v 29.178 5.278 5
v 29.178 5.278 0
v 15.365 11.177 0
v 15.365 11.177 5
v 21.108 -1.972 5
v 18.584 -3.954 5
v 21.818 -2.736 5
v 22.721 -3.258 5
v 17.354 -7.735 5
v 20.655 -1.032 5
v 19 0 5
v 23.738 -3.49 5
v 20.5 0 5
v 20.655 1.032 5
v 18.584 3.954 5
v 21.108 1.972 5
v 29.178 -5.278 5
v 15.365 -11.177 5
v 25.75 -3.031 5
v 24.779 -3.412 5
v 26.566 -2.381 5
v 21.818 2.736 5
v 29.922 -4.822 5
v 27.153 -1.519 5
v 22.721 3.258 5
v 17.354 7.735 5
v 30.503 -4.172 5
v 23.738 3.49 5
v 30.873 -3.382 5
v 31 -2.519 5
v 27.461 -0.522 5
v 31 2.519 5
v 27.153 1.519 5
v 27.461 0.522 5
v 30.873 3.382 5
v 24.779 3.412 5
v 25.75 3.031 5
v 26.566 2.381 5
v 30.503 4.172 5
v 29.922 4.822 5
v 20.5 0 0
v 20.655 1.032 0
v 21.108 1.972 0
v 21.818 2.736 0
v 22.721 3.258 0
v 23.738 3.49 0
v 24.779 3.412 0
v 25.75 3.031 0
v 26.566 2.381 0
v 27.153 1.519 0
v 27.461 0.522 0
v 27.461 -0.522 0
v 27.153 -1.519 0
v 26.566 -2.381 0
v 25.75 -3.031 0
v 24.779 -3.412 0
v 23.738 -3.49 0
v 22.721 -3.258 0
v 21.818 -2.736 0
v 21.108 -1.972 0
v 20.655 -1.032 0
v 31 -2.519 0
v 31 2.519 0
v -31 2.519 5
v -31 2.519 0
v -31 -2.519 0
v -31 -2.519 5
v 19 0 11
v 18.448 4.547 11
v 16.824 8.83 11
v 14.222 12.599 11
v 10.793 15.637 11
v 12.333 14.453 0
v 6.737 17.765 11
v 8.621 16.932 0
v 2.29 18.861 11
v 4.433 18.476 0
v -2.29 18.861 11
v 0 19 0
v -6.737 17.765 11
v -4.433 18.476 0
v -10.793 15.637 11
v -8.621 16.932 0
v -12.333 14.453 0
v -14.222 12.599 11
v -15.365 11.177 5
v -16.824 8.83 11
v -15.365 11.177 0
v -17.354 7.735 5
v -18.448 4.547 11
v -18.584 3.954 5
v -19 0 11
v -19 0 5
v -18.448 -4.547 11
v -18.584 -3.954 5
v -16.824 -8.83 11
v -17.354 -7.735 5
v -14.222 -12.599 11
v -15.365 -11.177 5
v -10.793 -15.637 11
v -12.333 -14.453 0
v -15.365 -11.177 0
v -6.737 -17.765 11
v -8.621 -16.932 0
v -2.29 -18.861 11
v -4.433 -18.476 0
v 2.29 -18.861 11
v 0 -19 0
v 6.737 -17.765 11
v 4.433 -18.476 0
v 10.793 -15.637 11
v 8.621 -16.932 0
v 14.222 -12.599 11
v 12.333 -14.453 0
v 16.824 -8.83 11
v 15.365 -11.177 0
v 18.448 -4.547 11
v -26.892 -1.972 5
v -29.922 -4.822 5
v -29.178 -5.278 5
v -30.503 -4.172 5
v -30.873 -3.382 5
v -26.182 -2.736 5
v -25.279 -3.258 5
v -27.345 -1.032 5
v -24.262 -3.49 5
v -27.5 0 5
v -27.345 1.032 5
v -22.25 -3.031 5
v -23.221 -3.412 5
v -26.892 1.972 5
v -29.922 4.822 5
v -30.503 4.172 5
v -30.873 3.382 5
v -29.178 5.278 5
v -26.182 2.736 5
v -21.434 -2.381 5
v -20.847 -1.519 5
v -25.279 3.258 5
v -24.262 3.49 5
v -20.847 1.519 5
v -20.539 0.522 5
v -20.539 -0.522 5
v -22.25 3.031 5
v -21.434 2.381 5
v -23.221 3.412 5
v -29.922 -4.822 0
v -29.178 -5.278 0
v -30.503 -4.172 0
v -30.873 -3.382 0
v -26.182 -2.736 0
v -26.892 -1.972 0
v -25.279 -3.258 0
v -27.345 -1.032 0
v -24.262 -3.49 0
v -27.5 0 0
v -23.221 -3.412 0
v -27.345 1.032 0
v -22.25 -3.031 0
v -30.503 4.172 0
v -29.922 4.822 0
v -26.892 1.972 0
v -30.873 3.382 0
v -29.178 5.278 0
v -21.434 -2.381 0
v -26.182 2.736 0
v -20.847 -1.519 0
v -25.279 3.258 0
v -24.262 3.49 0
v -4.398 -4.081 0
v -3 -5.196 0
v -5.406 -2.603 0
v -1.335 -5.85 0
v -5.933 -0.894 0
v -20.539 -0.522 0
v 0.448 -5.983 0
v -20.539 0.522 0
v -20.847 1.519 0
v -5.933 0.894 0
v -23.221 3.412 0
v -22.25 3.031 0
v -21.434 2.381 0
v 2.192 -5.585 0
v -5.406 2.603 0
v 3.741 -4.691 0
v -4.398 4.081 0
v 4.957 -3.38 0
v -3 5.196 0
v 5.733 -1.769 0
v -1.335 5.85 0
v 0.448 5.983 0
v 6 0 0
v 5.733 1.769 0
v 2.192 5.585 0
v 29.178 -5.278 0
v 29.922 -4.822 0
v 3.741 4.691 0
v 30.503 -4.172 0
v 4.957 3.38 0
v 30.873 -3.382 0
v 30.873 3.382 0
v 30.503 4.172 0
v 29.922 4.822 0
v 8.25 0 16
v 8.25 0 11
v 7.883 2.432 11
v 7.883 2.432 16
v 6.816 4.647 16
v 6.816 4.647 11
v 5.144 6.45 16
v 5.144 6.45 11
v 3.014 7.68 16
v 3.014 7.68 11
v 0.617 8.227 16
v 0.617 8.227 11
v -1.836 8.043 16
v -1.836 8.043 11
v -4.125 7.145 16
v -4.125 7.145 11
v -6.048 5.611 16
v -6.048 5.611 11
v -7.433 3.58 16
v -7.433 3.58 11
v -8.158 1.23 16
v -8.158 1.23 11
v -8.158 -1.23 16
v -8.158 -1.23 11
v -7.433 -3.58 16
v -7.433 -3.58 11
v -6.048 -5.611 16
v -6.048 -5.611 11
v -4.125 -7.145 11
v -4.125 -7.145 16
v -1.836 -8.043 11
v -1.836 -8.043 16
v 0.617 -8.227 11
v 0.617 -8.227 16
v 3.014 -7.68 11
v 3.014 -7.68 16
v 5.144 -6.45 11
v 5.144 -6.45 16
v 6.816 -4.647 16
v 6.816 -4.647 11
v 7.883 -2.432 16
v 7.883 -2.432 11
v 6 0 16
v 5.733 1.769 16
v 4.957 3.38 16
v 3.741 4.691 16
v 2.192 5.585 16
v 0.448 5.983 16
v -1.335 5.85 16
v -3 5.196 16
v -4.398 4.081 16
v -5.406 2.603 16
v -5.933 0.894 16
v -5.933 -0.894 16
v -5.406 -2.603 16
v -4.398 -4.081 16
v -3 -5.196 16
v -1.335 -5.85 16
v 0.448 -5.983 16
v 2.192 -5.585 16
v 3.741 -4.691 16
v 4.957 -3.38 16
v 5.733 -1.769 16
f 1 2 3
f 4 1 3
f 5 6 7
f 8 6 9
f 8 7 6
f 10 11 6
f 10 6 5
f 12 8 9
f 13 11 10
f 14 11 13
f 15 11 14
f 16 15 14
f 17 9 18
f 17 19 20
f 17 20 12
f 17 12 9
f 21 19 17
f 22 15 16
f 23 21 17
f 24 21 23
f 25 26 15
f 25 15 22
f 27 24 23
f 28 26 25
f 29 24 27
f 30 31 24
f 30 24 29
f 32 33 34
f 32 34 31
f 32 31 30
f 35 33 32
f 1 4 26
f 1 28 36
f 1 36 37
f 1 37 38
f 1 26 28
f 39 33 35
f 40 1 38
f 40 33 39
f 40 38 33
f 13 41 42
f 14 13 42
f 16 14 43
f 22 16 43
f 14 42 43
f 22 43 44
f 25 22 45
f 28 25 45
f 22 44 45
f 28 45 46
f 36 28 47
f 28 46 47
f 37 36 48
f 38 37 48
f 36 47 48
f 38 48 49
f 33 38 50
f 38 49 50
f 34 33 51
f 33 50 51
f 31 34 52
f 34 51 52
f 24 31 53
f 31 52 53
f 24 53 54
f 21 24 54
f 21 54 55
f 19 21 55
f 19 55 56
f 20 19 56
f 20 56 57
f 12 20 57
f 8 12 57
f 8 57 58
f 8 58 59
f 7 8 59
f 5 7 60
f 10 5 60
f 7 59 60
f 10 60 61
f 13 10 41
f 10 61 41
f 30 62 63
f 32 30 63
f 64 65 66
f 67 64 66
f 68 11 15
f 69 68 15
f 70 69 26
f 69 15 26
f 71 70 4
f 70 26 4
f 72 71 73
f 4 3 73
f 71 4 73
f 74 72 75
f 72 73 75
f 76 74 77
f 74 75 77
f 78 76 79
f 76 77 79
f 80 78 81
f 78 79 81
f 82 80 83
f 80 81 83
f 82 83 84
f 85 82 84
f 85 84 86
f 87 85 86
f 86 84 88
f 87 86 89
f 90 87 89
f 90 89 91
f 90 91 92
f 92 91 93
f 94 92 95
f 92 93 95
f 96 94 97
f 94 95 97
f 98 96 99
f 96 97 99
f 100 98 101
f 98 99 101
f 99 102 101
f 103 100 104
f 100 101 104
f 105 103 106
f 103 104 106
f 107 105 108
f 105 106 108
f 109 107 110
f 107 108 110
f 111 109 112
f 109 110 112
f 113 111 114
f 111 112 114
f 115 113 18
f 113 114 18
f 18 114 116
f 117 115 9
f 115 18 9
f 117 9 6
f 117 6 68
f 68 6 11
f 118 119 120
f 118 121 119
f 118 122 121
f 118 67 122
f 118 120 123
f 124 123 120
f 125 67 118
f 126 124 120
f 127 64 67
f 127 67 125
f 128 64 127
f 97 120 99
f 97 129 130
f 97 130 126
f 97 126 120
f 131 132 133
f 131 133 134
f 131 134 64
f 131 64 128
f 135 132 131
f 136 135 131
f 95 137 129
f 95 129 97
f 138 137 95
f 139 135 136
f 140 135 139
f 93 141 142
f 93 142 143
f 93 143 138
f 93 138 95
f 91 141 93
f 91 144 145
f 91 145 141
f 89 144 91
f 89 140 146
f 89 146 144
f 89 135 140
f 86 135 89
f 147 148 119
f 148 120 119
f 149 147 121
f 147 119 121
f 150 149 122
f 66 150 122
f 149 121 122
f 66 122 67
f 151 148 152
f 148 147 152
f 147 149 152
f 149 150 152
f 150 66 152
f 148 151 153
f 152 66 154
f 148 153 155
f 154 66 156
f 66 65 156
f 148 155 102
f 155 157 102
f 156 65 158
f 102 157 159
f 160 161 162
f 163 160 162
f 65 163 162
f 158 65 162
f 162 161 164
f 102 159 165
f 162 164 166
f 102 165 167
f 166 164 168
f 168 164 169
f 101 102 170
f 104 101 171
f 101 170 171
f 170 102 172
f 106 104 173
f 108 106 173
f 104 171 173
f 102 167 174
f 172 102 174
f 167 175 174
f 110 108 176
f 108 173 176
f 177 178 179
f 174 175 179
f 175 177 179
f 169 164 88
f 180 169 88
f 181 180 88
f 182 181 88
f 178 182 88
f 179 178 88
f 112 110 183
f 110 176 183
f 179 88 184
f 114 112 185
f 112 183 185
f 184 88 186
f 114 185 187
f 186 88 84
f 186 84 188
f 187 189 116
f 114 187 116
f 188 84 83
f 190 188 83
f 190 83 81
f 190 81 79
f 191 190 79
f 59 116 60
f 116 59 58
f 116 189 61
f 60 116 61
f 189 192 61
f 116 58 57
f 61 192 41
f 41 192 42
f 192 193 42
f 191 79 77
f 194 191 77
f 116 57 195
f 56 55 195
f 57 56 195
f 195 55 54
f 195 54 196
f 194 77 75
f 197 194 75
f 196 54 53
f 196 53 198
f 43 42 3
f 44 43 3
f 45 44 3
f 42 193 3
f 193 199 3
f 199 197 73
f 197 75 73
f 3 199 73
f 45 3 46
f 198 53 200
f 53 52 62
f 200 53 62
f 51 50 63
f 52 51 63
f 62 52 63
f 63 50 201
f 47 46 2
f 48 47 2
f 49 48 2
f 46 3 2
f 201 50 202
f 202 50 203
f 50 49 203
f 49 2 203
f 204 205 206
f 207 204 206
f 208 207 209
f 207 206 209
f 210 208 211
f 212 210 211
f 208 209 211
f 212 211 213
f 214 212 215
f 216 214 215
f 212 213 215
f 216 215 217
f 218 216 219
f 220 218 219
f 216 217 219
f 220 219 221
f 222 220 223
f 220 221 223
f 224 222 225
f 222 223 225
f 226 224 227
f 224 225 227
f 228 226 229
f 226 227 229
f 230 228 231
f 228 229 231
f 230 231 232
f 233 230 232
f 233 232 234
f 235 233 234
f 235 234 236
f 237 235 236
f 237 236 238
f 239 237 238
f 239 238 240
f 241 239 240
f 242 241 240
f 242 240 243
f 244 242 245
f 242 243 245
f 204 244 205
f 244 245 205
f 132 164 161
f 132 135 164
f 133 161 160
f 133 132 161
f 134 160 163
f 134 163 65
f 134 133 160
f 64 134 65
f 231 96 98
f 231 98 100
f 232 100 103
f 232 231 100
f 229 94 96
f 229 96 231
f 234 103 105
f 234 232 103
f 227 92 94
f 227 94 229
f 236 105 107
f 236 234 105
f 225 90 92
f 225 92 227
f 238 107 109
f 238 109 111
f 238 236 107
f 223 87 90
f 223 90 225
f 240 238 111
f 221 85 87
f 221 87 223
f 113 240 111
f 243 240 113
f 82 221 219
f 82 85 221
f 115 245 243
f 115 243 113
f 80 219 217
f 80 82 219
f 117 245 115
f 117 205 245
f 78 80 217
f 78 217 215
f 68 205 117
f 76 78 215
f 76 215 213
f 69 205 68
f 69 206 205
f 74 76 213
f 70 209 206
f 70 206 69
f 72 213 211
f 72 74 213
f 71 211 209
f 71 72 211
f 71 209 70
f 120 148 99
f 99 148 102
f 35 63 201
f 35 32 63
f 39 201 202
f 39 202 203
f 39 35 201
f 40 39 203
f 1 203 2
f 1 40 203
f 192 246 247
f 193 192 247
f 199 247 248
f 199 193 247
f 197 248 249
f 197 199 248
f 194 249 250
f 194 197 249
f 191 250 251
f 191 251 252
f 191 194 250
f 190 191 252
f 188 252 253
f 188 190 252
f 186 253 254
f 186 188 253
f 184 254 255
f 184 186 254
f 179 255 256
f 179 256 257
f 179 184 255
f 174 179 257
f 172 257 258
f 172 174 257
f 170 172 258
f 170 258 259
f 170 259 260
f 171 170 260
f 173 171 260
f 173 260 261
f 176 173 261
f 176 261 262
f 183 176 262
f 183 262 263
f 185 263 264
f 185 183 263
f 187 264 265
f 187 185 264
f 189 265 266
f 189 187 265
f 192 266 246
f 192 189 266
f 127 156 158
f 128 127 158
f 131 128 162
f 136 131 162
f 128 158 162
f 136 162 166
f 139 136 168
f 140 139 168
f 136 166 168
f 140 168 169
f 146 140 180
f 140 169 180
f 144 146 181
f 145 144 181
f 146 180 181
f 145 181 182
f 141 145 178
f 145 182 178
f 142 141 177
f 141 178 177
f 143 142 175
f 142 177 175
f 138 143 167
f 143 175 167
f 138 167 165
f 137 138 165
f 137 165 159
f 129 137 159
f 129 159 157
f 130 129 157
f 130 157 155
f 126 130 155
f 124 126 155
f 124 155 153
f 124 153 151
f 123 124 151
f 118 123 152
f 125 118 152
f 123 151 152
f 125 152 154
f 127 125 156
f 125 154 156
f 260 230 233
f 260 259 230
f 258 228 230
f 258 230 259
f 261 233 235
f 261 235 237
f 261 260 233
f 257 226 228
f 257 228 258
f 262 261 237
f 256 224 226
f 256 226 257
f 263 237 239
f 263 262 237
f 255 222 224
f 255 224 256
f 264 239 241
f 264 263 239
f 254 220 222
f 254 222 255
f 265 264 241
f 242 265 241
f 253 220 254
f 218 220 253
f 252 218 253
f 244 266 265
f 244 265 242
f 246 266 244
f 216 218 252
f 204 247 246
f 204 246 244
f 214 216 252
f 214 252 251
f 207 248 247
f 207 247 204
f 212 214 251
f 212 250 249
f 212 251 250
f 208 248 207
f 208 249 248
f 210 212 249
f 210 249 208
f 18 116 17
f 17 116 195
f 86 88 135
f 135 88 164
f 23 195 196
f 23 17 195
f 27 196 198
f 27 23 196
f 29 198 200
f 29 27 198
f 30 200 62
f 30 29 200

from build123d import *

# Parameters (mm, degrees)
SKETCH1_R           = 19
SKETCH1_R_2         = 6
BOSS_EXTRUDE1_DEPTH = 11
SKETCH2_R           = 8.25
SKETCH2_R_2         = 6
BOSS_EXTRUDE2_DEPTH = 5
SKETCH3_R           = 3.5
BOSS_EXTRUDE3_DEPTH = 5
FILLET1_R           = 3


with BuildPart() as part:
    # Sketch1 → Boss-Extrude1 (new body)
    with BuildSketch(Plane.XY):
        Circle(SKETCH1_R)
        Circle(SKETCH1_R_2, mode=Mode.SUBTRACT)
    extrude(amount=BOSS_EXTRUDE1_DEPTH)

    # Sketch2 → Boss-Extrude2 (add)
    with BuildSketch(Plane.XY.offset(11)):
        Circle(SKETCH2_R)
        Circle(SKETCH2_R_2, mode=Mode.SUBTRACT)
    extrude(amount=BOSS_EXTRUDE2_DEPTH)

    # Sketch3 → Boss-Extrude3 (add)
    # profile 1 of 2: a face of its own
    with BuildSketch(Plane(origin=(0, 0, 0), x_dir=(-1, 0, 0), z_dir=(0, 0, -1))):
        with BuildLine():
            Line((31, 4.5), (31, -4.5))
            Line((31, -4.5), (15.364682716, -11.177053505))
            ThreePointArc((15.364682716, -11.177053505), (19, 0), (15.364682716, 11.177053505))
            Line((15.364682716, 11.177053505), (31, 4.5))
        make_face()
        with Locations((24, 0)):
            Circle(SKETCH3_R, mode=Mode.SUBTRACT)
    # profile 2 of 2: a face of its own
    with BuildSketch(Plane(origin=(0, 0, 0), x_dir=(-1, 0, 0), z_dir=(0, 0, -1))):
        with BuildLine():
            Line((-15.364682716, -11.177053505), (-31, -4.5))
            Line((-31, -4.5), (-31, 4.5))
            Line((-31, 4.5), (-15.364682716, 11.177053505))
            ThreePointArc((-15.364682716, 11.177053505), (-19, 0), (-15.364682716, -11.177053505))
        make_face()
        with Locations((-24, 0)):
            Circle(SKETCH3_R, mode=Mode.SUBTRACT)
    extrude(amount=-BOSS_EXTRUDE3_DEPTH)

    # Fillet1
    fillet1_edges = [part.edges().sort_by_distance(p)[0] for p in [
        (31, -4.5, 2.5),
        (31, 4.5, 2.5),
        (-31, 4.5, 2.5),
        (-31, -4.5, 2.5),
    ]]
    fillet(fillet1_edges, radius=FILLET1_R)


solid = part.part
